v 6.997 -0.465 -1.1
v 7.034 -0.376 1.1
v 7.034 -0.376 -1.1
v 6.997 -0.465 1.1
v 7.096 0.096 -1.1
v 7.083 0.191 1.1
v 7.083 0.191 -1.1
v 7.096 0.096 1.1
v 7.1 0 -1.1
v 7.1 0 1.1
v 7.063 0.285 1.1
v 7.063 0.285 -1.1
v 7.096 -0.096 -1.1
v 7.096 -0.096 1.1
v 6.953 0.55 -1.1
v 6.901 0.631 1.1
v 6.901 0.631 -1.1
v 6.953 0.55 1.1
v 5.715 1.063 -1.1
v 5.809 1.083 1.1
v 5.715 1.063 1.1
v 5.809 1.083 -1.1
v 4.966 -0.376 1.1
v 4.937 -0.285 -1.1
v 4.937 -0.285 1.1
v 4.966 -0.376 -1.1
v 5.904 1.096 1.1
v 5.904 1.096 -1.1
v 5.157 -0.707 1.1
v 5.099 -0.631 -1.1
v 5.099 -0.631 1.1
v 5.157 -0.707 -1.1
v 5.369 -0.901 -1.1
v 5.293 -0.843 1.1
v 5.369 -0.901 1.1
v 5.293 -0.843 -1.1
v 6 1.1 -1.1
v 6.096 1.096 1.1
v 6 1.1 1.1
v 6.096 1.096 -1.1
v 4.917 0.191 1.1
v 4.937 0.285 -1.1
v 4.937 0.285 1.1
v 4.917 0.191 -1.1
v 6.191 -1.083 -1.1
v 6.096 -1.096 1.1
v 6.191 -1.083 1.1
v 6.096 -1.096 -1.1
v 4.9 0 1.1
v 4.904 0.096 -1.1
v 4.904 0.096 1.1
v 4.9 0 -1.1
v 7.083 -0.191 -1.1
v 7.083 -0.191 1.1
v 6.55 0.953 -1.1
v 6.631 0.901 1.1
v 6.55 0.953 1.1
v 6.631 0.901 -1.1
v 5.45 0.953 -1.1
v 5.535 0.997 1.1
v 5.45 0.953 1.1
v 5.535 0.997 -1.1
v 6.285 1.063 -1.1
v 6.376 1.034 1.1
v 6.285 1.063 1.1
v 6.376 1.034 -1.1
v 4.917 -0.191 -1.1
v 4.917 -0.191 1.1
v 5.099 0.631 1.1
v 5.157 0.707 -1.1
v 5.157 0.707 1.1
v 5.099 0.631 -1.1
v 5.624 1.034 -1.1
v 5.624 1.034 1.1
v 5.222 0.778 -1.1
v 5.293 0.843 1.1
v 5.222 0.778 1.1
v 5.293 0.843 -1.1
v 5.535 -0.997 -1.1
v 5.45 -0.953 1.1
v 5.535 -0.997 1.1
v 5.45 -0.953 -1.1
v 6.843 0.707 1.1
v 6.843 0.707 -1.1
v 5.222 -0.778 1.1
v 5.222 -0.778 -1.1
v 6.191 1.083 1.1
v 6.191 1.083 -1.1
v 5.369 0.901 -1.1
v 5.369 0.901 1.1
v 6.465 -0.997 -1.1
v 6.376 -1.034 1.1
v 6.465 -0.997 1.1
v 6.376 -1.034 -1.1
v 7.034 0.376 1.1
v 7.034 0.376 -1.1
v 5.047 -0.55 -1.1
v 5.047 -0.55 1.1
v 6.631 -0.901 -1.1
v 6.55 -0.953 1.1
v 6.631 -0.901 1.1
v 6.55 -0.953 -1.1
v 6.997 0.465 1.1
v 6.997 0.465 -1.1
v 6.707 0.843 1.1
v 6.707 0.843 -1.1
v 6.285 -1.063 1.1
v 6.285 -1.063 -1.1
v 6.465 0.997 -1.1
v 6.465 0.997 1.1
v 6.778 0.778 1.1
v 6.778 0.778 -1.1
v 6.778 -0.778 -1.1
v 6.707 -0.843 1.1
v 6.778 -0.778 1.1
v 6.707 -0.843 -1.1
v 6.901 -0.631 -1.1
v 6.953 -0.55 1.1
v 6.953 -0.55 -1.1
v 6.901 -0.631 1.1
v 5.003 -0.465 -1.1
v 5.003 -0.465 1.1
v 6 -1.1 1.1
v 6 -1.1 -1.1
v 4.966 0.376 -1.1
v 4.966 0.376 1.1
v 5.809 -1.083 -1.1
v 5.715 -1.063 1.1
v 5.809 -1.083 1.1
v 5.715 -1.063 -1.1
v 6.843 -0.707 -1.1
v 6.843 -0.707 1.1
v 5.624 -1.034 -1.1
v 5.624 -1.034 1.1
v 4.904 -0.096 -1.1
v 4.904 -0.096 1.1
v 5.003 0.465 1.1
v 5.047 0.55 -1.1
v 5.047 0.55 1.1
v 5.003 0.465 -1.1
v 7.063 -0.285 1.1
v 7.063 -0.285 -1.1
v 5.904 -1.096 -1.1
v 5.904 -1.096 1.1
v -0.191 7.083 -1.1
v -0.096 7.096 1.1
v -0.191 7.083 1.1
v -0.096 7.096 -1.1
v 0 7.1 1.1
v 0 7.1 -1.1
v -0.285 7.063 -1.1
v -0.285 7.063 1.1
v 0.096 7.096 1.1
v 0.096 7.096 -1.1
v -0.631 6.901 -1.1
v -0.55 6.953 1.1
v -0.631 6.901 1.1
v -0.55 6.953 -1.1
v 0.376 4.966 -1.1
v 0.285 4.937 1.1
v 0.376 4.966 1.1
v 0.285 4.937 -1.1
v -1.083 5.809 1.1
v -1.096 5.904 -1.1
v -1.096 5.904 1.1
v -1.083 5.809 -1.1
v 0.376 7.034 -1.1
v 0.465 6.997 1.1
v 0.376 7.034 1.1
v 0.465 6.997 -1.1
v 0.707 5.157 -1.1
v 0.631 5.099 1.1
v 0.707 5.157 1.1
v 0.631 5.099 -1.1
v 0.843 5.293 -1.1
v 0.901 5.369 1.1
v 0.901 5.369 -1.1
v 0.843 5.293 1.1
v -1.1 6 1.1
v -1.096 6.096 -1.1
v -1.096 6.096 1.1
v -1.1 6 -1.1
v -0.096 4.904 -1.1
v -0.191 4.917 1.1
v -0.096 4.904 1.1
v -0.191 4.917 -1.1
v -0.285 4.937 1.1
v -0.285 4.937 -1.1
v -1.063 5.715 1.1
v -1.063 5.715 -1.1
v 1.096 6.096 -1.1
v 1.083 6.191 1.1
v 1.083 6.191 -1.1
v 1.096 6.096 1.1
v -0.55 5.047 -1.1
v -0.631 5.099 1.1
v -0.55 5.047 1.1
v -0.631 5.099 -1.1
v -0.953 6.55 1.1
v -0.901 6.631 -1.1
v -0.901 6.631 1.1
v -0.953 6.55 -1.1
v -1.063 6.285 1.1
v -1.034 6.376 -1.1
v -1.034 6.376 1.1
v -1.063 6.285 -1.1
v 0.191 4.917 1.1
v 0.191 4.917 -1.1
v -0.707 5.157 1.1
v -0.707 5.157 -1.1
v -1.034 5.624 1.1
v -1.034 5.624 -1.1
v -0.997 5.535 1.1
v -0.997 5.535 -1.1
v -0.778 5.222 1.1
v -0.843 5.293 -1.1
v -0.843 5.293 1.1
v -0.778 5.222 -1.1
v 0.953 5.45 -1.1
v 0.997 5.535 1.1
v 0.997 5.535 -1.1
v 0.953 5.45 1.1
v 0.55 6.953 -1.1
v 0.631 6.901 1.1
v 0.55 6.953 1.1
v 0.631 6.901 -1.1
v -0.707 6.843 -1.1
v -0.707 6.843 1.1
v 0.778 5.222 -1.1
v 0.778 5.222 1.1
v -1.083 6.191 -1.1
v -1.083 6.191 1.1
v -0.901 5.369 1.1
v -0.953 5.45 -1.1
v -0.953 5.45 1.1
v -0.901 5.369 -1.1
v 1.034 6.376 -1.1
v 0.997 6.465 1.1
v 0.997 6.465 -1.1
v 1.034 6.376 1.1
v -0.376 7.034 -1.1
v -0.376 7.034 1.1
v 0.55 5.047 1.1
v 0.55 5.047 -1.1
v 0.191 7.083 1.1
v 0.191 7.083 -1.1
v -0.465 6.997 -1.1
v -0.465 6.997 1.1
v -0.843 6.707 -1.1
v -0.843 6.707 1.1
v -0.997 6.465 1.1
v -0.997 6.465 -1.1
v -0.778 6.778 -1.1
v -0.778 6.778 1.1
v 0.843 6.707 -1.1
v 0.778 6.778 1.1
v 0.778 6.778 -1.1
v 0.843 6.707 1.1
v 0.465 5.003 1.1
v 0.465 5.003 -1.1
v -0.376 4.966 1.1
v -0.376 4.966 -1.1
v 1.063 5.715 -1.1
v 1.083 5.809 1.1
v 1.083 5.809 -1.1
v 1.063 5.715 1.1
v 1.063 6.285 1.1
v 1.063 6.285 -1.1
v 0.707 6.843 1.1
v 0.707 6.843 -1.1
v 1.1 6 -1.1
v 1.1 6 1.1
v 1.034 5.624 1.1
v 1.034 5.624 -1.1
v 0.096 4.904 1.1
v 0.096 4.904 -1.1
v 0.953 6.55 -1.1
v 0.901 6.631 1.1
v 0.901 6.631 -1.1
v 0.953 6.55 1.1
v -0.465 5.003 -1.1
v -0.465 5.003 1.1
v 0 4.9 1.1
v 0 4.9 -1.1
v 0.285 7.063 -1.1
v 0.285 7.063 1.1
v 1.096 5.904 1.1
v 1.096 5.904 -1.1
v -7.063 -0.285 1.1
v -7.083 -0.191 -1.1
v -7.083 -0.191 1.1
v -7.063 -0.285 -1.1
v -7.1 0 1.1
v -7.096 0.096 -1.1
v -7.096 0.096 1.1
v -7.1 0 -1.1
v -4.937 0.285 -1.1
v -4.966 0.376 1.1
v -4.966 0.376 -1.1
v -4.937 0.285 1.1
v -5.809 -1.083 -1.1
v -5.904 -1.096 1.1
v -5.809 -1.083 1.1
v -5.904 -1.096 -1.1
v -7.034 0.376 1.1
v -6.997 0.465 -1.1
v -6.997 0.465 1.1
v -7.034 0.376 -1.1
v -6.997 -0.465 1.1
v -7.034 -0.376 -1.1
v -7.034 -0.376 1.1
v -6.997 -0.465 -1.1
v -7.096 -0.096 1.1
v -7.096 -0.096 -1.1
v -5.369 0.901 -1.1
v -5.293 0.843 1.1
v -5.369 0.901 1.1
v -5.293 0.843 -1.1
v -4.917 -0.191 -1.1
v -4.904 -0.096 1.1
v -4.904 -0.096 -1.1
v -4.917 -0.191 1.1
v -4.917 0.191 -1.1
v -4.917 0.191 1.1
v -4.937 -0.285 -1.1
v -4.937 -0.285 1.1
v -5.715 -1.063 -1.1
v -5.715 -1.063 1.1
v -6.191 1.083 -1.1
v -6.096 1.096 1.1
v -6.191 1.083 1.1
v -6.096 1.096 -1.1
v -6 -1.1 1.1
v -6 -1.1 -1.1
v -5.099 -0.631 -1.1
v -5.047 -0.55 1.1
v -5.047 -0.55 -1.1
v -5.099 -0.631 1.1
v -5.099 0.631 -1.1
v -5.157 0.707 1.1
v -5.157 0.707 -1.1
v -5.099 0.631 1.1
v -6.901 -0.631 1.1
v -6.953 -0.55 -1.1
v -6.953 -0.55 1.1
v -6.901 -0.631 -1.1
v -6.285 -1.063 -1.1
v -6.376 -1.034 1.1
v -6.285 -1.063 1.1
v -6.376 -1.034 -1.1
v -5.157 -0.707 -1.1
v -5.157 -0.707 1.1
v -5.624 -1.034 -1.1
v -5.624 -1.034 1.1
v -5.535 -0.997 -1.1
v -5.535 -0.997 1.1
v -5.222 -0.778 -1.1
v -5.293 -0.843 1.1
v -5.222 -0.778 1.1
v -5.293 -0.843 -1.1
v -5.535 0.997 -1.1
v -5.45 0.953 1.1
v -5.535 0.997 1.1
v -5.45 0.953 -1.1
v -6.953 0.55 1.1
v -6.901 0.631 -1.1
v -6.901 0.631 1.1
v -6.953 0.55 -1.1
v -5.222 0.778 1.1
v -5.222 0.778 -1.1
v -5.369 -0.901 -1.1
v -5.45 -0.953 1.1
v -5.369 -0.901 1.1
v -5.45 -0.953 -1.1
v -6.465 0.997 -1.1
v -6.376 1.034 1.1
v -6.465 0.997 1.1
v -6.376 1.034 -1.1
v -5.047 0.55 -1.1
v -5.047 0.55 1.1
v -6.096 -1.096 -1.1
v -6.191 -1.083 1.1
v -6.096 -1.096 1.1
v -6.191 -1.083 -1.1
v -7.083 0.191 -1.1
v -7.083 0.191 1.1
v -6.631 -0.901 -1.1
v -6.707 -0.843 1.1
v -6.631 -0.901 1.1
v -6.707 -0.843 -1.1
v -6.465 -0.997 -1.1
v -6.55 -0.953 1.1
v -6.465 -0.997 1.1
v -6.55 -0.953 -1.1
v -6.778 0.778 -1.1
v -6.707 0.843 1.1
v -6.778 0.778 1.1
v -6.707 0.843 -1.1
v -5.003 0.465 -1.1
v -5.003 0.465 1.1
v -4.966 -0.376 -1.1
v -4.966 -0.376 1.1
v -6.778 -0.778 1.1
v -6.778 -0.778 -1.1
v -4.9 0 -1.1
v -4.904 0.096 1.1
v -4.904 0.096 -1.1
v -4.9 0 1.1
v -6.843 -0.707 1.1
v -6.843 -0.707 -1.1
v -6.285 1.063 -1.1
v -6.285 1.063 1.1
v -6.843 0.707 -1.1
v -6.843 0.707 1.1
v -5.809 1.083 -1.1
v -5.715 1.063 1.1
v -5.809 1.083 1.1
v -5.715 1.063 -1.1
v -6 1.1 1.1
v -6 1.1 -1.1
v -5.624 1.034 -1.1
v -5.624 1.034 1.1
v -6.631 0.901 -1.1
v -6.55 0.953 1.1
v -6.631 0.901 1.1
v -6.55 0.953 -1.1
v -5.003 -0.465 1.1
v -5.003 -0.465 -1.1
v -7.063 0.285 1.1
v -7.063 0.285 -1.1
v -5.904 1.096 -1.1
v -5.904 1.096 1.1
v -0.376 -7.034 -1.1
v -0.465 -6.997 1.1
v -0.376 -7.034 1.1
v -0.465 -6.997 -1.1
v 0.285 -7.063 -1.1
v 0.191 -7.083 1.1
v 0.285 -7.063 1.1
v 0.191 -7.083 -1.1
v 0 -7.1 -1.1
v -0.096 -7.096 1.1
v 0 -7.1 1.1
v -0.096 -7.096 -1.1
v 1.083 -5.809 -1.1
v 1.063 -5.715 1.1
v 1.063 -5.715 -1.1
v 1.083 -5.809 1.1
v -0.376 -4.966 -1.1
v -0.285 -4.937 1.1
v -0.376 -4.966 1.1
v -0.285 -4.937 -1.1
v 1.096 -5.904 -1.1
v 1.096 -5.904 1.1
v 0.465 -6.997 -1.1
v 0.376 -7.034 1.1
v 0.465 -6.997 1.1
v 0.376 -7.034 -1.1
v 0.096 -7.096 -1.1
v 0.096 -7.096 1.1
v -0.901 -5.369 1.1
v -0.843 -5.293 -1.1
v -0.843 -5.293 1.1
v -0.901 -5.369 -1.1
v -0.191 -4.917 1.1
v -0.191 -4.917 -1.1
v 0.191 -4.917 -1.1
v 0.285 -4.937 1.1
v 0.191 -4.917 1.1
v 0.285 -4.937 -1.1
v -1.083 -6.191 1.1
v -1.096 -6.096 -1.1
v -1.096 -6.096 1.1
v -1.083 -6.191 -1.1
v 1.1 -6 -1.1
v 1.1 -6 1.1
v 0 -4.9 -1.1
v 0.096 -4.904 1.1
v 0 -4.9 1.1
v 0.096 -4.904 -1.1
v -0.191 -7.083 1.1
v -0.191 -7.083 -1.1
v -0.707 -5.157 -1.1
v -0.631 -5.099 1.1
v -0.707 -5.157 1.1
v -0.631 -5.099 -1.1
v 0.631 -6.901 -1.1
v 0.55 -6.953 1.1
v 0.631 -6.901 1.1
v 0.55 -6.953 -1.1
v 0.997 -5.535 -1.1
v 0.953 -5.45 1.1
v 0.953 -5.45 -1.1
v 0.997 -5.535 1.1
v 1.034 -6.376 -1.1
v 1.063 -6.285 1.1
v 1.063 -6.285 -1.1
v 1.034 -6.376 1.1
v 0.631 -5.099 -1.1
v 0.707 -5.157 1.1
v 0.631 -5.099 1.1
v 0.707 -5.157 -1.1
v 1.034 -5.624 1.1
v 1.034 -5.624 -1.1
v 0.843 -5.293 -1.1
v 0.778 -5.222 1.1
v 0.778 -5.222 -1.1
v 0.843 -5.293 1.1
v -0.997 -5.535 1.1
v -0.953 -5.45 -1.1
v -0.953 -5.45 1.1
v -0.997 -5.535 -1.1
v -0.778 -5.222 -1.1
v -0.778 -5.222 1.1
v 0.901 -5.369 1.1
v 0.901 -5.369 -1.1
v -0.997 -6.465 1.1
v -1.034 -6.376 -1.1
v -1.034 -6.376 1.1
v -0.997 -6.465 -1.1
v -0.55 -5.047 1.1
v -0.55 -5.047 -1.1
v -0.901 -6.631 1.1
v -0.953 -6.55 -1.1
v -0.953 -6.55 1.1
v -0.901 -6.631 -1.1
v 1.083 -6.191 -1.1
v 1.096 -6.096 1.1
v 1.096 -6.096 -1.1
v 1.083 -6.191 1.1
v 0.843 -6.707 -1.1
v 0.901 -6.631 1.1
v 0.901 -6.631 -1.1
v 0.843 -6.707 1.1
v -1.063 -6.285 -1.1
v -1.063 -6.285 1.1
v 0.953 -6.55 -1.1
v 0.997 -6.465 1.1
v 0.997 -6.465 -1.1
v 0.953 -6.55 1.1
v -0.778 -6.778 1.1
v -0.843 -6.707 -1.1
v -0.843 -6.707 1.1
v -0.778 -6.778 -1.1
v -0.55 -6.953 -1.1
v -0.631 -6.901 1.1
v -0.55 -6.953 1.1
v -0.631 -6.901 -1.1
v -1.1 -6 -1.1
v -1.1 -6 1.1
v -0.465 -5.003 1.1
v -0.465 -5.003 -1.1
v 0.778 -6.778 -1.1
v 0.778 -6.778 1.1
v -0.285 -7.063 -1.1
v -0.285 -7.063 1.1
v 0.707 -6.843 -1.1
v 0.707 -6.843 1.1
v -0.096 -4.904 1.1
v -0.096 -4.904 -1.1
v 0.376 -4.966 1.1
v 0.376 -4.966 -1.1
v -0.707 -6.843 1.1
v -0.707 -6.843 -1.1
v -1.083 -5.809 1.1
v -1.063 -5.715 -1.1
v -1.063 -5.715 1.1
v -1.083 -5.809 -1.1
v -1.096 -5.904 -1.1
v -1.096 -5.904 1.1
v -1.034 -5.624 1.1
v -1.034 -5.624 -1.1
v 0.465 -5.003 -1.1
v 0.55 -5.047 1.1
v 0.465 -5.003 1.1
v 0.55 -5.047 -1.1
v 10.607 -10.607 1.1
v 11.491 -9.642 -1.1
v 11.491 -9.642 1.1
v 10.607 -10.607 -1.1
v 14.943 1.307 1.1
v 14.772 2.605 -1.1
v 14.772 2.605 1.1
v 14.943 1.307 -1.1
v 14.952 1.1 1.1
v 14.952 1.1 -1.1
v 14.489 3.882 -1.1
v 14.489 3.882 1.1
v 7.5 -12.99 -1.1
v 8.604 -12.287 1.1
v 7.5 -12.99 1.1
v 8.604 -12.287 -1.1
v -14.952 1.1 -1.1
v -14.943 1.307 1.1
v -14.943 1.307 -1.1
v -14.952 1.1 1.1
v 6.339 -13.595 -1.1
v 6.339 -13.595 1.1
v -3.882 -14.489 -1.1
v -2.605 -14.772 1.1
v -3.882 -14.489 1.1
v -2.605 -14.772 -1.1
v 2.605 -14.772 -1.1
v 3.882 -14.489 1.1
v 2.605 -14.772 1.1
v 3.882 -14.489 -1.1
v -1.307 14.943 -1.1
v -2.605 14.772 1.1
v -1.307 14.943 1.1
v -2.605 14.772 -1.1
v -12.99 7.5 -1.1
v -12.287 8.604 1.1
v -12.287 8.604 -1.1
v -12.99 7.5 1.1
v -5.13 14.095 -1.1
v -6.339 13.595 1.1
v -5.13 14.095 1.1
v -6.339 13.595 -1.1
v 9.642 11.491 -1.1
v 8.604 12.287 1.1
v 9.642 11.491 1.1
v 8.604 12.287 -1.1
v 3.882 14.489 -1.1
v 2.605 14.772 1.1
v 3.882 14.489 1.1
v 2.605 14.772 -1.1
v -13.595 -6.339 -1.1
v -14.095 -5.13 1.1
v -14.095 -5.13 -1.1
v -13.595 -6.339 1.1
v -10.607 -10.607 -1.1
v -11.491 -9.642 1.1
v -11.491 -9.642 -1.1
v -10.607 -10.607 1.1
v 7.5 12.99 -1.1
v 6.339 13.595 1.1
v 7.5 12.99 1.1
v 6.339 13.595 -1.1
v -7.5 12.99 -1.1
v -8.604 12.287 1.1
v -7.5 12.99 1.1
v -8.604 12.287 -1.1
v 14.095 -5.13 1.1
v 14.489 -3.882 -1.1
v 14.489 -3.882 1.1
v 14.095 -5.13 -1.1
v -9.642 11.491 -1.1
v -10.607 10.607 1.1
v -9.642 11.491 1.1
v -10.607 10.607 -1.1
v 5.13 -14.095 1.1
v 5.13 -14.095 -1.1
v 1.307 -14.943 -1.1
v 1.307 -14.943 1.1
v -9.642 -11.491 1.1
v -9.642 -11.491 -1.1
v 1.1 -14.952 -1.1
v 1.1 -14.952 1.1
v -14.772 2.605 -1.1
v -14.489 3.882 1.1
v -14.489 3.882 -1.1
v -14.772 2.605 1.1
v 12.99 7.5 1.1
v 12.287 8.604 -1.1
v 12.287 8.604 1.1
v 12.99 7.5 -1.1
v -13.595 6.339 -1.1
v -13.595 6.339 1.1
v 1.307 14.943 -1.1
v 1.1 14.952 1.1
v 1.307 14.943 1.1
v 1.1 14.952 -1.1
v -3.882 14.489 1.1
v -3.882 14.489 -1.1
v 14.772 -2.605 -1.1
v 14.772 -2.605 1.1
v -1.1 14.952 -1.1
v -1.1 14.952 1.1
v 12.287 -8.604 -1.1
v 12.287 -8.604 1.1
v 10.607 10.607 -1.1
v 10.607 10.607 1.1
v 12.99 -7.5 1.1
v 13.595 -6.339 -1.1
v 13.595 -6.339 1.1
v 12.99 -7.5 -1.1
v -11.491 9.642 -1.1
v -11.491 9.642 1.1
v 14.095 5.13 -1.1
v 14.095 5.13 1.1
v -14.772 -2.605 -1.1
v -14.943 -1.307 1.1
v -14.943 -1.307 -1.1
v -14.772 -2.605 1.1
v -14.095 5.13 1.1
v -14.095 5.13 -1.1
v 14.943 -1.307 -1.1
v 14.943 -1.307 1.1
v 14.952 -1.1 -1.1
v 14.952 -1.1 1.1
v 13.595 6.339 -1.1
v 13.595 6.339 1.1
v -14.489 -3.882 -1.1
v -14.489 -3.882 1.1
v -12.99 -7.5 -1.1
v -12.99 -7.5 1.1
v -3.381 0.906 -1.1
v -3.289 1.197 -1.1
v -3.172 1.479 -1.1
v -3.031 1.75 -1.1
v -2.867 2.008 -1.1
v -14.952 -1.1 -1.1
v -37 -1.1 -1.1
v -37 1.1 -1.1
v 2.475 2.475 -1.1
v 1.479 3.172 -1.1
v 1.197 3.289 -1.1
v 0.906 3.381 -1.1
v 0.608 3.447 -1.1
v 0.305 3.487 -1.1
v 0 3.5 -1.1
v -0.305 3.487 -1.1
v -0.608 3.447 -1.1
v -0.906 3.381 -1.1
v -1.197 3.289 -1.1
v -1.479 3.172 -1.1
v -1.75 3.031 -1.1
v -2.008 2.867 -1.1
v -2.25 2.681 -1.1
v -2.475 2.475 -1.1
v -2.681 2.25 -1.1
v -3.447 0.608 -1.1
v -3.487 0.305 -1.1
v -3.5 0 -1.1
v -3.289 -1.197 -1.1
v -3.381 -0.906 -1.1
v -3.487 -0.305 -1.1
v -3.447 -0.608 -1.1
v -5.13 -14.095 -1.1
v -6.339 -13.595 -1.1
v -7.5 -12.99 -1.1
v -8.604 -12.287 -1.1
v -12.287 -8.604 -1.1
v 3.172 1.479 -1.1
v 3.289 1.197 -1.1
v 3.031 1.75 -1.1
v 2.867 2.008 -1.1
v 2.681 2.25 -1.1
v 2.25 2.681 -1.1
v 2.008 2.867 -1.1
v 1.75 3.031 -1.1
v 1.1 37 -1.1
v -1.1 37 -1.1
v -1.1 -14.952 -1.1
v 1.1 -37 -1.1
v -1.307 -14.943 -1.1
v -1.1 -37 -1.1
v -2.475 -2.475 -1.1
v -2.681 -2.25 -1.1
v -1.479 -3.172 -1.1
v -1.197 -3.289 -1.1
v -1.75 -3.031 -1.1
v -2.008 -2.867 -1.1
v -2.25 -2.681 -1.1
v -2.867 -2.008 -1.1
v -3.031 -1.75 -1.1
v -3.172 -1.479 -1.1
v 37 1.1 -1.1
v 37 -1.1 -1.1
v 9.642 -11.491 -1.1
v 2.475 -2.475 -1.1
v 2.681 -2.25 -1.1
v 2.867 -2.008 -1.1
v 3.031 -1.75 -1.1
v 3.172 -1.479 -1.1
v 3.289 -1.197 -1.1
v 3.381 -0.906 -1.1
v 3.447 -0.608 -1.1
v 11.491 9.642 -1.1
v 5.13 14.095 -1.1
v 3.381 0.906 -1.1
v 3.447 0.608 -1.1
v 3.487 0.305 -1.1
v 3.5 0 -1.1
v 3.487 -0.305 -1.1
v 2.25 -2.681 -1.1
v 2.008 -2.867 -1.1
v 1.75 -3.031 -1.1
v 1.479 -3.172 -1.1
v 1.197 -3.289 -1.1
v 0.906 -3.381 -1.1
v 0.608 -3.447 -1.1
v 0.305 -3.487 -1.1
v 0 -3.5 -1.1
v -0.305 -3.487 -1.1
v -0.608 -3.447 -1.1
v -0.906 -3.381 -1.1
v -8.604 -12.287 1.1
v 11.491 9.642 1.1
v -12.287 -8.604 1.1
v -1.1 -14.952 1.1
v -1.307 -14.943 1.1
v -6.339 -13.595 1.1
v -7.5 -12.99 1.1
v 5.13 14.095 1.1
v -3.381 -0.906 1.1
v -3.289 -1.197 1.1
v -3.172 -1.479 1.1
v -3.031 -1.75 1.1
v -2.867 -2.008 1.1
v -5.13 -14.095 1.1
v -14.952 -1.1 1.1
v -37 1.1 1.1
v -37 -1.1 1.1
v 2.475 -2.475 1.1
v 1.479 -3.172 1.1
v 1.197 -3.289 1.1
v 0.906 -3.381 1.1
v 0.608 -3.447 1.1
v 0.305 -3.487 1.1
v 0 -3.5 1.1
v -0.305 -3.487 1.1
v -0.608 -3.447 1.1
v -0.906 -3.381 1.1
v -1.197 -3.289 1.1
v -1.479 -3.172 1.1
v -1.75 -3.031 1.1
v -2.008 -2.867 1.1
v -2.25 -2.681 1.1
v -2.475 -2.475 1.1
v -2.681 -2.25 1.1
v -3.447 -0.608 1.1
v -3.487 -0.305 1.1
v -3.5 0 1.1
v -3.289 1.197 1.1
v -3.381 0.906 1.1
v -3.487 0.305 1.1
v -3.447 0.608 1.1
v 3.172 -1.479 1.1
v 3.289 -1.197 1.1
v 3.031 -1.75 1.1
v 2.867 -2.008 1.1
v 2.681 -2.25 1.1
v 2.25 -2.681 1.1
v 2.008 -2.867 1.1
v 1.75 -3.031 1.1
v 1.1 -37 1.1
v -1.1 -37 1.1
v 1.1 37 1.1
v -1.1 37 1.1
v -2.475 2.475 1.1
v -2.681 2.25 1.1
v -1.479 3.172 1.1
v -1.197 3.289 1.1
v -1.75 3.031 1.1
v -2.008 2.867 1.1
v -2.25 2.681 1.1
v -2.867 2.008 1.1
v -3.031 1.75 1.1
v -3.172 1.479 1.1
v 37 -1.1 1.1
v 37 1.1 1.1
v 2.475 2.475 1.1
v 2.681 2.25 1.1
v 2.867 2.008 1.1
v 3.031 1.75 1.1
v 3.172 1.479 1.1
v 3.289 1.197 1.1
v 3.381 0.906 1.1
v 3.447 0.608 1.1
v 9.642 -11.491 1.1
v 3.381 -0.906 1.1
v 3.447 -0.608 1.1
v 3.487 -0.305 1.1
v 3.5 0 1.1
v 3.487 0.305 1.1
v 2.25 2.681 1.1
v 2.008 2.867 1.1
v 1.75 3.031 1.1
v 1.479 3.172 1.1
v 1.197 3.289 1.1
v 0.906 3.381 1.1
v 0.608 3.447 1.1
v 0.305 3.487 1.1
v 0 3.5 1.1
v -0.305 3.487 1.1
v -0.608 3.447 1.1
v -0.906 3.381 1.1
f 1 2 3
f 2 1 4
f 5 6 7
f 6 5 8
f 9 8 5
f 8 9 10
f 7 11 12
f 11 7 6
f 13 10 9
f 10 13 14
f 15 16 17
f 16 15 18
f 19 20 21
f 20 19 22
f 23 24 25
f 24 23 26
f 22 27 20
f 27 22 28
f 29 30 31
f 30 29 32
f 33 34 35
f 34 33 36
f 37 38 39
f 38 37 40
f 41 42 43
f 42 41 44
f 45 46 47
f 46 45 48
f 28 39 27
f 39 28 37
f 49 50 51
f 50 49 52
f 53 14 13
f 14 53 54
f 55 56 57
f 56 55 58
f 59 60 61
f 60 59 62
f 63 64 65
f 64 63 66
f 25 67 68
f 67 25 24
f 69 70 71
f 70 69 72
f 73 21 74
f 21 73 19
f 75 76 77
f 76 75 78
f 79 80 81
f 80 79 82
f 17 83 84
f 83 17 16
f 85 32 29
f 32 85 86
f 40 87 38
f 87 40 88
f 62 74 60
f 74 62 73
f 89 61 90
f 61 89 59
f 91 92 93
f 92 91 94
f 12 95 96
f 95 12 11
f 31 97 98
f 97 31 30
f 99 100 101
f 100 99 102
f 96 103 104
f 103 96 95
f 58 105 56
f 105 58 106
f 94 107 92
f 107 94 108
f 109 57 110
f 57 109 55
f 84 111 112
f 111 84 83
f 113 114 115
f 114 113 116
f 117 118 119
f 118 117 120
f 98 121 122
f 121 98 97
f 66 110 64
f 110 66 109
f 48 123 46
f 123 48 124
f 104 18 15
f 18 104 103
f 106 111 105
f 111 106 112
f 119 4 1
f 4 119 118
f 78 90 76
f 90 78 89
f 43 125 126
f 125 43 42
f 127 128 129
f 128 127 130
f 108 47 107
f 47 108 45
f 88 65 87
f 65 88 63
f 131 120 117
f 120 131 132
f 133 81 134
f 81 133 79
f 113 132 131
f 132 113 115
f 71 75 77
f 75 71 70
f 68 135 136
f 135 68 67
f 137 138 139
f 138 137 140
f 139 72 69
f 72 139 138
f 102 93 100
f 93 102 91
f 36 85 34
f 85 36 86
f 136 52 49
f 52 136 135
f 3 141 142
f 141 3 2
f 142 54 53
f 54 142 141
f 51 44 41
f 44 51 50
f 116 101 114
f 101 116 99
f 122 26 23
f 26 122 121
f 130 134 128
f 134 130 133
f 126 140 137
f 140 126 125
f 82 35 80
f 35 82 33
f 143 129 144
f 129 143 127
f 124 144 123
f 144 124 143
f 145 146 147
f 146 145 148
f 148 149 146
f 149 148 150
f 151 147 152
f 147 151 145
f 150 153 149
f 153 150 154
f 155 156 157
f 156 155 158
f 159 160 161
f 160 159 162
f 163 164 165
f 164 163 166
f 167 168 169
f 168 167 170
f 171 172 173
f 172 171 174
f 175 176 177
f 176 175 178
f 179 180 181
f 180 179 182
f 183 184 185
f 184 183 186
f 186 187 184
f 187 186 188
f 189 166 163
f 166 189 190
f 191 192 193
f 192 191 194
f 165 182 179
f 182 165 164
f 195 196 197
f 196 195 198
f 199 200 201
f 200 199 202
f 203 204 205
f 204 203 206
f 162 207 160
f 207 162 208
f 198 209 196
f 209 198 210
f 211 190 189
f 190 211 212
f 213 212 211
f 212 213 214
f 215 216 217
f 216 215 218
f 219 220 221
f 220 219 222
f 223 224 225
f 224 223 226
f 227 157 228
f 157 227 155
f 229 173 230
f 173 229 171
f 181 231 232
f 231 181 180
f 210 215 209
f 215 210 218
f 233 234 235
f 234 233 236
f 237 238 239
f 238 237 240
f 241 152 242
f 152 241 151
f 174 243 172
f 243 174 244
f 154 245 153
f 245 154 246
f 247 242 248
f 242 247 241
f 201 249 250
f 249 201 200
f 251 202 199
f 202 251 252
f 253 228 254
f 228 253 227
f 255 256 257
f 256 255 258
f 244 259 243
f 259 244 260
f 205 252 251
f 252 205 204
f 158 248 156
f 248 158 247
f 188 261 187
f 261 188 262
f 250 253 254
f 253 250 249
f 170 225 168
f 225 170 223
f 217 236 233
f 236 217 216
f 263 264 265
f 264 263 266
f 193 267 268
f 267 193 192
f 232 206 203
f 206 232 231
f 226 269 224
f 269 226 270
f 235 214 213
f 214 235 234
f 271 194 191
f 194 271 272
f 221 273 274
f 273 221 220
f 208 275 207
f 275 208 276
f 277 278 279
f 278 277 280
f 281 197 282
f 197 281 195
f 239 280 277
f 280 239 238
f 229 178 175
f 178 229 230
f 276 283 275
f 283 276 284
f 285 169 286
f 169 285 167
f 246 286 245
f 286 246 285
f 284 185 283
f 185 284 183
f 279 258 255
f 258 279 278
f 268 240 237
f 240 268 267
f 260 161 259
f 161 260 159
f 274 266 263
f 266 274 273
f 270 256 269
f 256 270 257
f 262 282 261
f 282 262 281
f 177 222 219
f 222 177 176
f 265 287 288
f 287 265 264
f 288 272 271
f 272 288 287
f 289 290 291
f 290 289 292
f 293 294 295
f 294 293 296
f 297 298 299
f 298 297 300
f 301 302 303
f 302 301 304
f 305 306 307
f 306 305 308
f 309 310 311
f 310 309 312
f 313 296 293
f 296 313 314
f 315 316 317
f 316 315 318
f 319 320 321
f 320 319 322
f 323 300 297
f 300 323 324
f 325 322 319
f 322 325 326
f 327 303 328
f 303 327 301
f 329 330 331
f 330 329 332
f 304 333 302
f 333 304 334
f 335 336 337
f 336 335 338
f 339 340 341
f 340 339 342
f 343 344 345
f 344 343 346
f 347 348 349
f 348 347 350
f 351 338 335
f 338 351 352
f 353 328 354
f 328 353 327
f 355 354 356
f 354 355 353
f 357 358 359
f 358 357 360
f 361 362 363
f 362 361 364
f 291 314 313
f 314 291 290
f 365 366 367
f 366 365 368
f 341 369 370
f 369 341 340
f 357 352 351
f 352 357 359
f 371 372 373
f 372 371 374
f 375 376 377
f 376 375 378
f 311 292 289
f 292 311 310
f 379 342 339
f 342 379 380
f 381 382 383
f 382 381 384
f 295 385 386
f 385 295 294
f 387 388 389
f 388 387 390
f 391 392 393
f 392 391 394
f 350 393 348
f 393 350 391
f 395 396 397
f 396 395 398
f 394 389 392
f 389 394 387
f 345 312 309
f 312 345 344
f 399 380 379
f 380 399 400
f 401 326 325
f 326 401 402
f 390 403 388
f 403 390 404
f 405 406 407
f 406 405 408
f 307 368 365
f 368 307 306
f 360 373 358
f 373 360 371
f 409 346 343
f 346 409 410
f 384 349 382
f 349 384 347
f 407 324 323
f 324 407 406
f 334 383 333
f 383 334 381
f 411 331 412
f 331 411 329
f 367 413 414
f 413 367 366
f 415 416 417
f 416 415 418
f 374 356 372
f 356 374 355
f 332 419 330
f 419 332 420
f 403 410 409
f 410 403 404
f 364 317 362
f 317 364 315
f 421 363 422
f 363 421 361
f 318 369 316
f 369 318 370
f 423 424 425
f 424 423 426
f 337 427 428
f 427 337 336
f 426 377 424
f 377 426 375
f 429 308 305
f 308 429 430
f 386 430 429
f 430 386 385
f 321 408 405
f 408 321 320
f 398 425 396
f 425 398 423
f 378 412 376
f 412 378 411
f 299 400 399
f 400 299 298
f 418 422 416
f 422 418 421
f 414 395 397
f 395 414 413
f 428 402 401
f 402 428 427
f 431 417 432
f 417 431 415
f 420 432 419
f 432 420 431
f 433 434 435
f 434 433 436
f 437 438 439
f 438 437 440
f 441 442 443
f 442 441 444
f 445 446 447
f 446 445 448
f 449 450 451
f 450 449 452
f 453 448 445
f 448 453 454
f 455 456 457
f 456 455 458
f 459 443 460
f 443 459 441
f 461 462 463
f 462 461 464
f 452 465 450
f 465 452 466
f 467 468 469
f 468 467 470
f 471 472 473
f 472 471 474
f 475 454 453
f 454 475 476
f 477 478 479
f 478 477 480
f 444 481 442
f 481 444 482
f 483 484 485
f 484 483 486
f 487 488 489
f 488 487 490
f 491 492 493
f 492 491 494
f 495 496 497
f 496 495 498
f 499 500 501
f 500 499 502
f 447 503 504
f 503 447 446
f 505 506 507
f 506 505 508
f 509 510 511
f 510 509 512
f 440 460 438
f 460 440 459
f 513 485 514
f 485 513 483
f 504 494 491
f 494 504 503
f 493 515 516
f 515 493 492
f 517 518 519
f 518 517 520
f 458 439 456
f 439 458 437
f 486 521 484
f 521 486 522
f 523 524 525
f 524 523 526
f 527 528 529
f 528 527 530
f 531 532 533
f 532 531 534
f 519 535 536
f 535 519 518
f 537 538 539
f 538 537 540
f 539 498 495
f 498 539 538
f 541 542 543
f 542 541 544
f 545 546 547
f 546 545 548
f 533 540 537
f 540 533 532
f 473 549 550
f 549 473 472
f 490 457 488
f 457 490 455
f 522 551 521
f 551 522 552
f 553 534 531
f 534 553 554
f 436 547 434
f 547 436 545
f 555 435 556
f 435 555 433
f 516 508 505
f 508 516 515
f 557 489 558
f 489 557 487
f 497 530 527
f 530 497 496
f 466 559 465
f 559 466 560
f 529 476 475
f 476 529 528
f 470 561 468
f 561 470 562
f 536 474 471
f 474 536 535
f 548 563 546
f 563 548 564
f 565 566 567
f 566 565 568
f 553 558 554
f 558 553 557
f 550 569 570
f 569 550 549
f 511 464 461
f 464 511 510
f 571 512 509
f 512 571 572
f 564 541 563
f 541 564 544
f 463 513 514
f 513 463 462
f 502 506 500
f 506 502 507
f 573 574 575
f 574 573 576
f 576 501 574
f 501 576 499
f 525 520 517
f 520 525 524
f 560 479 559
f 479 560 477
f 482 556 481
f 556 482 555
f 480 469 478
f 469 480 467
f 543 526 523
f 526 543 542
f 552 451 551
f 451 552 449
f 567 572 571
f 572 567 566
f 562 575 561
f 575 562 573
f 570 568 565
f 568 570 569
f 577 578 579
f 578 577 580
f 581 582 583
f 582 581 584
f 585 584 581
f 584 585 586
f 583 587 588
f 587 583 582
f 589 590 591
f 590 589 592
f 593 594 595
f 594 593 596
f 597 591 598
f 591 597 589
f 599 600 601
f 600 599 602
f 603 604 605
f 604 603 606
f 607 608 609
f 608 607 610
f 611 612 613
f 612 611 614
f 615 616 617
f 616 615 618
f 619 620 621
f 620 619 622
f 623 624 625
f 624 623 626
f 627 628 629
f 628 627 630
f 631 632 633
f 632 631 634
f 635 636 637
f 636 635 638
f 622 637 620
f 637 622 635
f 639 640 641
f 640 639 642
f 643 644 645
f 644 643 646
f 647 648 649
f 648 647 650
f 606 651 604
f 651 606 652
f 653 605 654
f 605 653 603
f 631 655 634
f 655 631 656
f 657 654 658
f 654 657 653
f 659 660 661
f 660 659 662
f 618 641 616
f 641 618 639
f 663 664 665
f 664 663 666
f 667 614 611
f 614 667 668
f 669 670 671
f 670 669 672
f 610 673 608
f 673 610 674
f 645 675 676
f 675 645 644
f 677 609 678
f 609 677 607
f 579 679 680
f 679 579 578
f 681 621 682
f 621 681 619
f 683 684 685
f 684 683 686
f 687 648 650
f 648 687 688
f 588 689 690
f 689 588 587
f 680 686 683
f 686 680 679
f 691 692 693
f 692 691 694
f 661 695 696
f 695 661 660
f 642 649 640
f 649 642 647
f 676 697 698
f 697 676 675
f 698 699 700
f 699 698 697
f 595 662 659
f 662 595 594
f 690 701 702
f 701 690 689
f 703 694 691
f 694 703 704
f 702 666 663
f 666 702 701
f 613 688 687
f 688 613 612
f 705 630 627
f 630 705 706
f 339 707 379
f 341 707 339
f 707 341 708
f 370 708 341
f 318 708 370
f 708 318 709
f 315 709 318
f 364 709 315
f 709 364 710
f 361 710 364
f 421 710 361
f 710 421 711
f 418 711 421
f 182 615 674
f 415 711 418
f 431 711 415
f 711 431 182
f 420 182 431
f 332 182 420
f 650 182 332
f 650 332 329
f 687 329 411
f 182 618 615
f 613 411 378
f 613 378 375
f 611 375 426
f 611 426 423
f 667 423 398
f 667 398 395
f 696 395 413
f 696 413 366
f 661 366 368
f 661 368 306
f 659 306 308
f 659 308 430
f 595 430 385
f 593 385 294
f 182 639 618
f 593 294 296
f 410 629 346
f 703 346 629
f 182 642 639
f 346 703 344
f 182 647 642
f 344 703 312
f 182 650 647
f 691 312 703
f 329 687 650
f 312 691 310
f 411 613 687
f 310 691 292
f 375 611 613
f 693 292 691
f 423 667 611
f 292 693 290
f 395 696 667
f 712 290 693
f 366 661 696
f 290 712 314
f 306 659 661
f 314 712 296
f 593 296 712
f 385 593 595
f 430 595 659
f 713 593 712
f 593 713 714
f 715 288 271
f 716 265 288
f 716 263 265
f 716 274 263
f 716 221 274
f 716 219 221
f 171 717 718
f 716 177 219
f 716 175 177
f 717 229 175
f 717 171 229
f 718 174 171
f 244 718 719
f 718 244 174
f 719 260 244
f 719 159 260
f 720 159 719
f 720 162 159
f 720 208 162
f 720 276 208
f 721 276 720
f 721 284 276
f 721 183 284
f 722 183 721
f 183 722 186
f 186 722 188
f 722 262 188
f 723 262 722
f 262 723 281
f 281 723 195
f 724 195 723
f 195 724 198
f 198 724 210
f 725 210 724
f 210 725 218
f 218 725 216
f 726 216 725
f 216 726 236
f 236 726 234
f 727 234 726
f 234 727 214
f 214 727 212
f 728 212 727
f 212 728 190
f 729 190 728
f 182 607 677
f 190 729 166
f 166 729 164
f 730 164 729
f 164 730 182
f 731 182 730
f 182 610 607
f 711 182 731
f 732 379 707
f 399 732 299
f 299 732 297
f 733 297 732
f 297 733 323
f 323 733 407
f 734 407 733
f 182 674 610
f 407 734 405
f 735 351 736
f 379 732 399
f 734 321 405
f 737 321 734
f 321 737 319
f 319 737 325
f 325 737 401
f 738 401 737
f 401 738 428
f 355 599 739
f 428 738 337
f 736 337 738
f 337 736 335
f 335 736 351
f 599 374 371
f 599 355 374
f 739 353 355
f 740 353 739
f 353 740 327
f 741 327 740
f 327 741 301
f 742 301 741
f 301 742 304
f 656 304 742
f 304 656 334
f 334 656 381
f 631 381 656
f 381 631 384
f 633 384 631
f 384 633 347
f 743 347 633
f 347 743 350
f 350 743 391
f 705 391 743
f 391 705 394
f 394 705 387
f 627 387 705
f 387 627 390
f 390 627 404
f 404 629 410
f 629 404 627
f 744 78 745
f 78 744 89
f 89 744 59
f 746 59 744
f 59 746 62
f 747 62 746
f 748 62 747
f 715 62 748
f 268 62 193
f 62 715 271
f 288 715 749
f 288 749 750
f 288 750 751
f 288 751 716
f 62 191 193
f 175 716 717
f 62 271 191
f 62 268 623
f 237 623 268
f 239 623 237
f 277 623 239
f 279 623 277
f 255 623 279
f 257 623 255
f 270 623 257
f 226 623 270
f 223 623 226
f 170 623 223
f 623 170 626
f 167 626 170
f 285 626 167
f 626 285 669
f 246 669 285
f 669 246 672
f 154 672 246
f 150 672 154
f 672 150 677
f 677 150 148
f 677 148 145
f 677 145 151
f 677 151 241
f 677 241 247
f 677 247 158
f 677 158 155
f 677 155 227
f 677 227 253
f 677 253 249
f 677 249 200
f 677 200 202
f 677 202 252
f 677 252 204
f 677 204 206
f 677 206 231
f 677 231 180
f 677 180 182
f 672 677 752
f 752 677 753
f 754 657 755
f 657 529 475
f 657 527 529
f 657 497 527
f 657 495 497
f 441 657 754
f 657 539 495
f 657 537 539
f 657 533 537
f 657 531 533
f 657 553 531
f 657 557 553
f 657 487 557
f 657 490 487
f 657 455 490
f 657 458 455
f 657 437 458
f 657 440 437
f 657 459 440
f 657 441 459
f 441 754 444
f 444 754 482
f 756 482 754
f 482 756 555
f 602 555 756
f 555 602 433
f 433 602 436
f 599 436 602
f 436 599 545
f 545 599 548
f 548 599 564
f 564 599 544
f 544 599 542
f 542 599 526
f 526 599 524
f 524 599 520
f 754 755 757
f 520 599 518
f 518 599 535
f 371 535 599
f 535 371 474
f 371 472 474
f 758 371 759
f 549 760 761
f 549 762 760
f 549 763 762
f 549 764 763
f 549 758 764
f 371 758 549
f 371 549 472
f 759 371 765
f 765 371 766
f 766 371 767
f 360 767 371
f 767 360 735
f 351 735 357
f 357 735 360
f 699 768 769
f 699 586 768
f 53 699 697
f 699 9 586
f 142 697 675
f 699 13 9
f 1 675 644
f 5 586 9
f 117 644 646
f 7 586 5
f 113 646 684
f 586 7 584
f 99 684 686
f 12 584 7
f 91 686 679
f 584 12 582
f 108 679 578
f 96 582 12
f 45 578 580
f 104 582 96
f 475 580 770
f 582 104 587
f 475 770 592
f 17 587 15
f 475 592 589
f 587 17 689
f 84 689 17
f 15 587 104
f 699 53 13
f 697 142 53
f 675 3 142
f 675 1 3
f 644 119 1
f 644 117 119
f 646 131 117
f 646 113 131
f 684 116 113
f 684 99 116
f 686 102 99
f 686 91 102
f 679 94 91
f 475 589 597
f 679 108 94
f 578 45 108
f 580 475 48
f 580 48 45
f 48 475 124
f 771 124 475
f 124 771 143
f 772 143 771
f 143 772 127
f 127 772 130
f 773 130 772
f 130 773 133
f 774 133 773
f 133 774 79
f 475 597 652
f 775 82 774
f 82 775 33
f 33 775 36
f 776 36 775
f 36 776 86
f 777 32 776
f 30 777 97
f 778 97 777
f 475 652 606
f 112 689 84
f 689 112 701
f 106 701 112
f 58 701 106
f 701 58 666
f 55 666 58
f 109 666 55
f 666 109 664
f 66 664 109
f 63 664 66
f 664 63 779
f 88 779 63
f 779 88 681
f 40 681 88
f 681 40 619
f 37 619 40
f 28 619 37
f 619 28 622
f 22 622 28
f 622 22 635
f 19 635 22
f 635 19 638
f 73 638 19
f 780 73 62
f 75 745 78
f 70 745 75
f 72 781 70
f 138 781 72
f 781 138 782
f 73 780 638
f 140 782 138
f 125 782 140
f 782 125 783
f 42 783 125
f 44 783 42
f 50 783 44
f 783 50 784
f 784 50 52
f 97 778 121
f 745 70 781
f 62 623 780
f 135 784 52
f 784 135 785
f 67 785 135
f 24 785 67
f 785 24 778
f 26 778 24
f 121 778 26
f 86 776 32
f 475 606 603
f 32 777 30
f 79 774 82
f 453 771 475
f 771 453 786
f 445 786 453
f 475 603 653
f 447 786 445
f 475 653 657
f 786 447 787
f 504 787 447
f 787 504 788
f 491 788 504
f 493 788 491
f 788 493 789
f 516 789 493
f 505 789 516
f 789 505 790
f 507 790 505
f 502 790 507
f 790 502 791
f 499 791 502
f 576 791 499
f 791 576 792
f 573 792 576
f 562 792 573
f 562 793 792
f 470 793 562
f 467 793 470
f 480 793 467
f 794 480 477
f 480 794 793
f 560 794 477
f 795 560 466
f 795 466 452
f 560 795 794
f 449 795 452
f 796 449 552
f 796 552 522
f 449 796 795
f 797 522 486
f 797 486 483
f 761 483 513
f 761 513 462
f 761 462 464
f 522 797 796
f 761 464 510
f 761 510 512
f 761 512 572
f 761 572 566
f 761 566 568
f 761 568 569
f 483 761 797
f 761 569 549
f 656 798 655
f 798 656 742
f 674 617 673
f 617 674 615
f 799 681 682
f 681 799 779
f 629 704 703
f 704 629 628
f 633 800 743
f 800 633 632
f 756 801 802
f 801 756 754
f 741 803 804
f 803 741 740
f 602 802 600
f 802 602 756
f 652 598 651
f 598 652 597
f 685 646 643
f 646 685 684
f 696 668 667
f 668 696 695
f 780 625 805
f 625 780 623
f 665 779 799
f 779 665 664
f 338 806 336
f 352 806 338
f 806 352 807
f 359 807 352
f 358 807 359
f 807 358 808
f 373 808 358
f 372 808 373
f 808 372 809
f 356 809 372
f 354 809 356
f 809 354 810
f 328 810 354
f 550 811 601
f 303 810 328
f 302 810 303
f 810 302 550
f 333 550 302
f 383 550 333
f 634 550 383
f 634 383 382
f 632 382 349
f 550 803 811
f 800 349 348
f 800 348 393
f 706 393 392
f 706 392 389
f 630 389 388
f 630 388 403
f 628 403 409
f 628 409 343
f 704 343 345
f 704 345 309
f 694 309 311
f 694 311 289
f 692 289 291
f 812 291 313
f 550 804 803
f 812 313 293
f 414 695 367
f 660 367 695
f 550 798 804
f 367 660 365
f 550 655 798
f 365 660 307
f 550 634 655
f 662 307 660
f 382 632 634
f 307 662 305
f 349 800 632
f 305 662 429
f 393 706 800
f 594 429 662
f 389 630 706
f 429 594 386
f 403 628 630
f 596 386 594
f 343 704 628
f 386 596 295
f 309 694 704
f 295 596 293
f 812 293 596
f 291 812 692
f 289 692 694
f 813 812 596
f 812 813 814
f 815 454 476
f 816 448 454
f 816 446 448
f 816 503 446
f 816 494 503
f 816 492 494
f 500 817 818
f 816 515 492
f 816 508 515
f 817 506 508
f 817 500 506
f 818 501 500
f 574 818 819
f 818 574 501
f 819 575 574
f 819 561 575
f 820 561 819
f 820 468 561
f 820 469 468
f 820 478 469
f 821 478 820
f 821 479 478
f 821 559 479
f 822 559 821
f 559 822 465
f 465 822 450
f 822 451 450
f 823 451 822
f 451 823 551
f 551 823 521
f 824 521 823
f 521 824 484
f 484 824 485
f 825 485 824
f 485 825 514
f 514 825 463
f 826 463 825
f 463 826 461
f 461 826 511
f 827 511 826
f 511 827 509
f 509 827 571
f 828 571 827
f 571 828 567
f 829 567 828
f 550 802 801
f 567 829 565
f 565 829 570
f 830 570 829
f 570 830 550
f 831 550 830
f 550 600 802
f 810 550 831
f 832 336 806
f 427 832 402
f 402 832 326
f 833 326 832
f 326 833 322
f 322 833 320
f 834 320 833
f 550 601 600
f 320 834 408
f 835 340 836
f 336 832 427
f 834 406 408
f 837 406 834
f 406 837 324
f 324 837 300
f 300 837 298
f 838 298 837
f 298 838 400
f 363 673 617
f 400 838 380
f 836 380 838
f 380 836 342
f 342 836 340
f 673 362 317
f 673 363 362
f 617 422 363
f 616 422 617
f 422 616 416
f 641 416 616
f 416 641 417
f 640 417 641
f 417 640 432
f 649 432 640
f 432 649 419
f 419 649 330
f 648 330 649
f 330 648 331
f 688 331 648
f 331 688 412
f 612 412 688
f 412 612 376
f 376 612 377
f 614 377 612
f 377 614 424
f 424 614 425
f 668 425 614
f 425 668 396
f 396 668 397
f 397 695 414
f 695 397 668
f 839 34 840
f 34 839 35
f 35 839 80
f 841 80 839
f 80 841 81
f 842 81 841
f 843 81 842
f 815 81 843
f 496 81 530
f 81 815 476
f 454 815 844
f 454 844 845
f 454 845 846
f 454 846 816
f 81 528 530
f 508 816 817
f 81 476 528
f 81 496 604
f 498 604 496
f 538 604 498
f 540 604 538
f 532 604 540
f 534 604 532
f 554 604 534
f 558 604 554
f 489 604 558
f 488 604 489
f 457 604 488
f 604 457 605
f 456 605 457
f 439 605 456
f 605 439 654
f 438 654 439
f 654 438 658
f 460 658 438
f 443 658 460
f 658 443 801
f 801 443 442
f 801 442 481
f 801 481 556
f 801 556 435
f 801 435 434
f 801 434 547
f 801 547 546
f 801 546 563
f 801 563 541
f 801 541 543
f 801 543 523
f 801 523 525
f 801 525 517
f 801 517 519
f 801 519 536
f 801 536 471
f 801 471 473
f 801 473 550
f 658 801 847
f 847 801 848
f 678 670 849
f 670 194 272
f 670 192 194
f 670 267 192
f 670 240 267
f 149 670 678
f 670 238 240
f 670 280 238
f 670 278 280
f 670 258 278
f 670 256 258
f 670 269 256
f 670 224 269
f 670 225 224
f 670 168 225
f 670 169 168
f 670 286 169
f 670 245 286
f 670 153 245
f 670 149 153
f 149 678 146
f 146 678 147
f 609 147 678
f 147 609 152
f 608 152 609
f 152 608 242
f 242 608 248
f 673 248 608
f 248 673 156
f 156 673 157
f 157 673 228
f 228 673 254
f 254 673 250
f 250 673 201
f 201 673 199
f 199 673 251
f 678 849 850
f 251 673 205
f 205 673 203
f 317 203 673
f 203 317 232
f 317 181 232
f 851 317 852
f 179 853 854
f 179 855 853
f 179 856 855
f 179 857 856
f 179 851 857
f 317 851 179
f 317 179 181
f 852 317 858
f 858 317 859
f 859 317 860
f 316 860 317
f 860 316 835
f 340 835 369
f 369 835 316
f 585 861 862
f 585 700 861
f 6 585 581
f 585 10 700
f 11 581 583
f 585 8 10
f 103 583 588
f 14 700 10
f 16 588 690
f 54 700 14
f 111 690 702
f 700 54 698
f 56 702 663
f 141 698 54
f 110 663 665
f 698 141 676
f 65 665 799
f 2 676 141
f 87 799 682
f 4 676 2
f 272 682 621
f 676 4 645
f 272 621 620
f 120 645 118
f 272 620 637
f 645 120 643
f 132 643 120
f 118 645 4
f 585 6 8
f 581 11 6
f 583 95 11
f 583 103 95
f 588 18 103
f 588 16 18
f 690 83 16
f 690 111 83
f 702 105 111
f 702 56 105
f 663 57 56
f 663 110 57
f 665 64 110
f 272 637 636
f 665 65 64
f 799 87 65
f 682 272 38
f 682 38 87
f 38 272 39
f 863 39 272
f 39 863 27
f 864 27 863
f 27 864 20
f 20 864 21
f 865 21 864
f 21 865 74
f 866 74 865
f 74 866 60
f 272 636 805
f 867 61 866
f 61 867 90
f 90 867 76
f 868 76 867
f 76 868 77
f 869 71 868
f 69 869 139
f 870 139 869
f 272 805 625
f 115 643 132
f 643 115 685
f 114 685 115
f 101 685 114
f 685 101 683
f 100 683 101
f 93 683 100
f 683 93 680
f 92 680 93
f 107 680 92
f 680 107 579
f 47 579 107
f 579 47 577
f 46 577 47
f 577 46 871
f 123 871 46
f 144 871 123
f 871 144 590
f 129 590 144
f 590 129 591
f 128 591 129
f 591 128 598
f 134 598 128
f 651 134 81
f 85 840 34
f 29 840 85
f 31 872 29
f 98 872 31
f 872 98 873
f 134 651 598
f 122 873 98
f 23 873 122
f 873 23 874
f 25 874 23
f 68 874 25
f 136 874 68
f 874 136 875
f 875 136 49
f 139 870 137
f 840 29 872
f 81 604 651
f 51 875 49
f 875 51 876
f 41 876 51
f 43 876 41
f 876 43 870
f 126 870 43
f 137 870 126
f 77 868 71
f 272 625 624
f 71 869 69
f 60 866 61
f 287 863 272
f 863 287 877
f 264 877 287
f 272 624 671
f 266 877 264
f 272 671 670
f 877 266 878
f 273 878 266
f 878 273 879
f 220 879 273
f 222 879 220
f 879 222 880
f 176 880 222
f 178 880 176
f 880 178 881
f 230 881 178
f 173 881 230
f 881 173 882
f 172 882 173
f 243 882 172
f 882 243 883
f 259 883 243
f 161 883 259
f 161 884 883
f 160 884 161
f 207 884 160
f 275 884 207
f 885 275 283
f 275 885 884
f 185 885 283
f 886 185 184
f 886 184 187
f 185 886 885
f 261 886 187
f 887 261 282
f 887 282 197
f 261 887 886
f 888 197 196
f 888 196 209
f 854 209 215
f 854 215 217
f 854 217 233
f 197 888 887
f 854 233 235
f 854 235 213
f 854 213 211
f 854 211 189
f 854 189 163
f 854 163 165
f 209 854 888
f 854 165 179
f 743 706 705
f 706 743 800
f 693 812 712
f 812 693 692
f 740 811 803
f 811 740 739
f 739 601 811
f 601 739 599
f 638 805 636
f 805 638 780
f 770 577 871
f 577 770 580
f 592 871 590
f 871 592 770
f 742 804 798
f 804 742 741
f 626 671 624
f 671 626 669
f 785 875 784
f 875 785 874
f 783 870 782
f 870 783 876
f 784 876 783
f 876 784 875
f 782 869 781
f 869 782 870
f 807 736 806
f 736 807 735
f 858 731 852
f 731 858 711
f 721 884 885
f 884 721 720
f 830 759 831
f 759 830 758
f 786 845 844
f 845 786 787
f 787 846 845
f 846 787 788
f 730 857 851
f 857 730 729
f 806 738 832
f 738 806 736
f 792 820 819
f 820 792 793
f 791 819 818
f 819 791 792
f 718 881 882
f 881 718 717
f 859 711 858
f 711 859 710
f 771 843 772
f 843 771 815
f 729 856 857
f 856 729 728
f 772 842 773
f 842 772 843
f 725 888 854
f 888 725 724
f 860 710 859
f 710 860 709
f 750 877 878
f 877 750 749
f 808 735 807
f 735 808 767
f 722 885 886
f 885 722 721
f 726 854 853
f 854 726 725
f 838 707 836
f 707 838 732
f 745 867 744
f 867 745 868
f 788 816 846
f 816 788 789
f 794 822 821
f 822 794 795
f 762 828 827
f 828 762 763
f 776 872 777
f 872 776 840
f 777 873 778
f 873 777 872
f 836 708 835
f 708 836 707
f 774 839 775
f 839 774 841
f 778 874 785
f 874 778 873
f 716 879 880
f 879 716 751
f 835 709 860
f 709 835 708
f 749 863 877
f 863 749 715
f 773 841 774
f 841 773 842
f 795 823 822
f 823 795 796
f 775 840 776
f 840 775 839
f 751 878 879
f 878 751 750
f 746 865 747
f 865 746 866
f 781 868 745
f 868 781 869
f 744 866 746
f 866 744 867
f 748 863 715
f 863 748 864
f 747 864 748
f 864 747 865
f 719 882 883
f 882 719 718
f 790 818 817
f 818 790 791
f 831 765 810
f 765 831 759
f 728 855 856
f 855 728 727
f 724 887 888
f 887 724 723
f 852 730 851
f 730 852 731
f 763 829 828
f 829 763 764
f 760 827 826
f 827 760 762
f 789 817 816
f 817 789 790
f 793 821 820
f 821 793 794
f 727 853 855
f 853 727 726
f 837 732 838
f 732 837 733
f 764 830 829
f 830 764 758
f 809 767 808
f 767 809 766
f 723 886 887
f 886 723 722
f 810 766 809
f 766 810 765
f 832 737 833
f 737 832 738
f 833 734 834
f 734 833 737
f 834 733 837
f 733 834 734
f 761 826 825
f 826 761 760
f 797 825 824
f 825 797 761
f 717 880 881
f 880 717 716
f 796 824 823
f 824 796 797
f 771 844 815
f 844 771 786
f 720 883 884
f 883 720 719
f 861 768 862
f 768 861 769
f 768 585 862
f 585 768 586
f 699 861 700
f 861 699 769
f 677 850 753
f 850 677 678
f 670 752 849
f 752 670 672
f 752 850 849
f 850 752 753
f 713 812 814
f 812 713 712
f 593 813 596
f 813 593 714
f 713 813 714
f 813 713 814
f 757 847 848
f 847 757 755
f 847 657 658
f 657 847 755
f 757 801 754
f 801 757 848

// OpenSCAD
// file: 55_stage1_print_parameters.scad
/* BUDDY FILE 55 - STAGE 1 PRINT / INTERFACE PARAMETERS
All dimensions mm. Values marked PROCESS are starting points for calibration coupons. */
B1_OD=115; B1_CAVITY_D=111; B1_AIRWAY_D=70; B1_DUCT_OD=74;
B1_SHELL_R=B1_OD/2; B1_CAVITY_R=B1_CAVITY_D/2;
B1_WALL=2.0; B1_MIN_RIB=2.2; B1_MIN_WEB=1.2;
B1_FDM_SLIDE=0.30;       // PROCESS: per side, calibrate
B1_FDM_PRESS=0.10;       // PROCESS: per side, calibrate
B1_INSERT_OD=3.2;        // PLACEHOLDER for M2-class heat-set insert; replace from selected insert drawing
B1_M2_CLEAR=2.4;         // PROCESS starting clearance
B1_M2_HEAD=4.3;          // PLACEHOLDER head pocket
B1_M2_HEAD_H=1.8;
B1_POLAR_OPENING_D=74.8;
B1_CAMERA_DUCT_GAP=0.8; B1_CAMERA_SHELL_MARGIN=1.0;
B1_ROTOR_NOMINAL_R=34.6; B1_ROTOR_STATIC_RADIAL_GAP=B1_AIRWAY_D/2-B1_ROTOR_NOMINAL_R;
assert(B1_OD==115); assert(B1_CAVITY_D==111); assert(B1_AIRWAY_D==70);
assert(B1_POLAR_OPENING_D>B1_DUCT_OD);
assert(B1_ROTOR_STATIC_RADIAL_GAP>0);
echo("FILE55 Stage1 architecture OD/cavity/airway =",B1_OD,B1_CAVITY_D,B1_AIRWAY_D);
echo("PROCESS tolerances require calibration before production prints");
// main file
/* BUDDY FILE87 - MOTOR/STATOR MOUNT INTERFACE V1
Hardware-controlled dimensions are explicit variables, never hidden guesses. */
include <55_stage1_print_parameters.scad>
$fn=72;
MOTOR_D=20; MOTOR_LEN=10; BOLT_CIRCLE=12; BOLT_D=2.2; HUB_D=7; PLATE_T=2.2;
module motor_plate(){
 difference(){
  cylinder(h=PLATE_T,d=30,center=true);
  cylinder(h=PLATE_T+1,d=HUB_D,center=true);
  for(a=[0:90:270])rotate([0,0,a])translate([BOLT_CIRCLE/2,0,0])cylinder(h=PLATE_T+1,d=BOLT_D,center=true);
 }
}
module stator_mount(){
 motor_plate();
 for(a=[0:90:270])rotate([0,0,a])translate([B1_DUCT_OD/4+7,0,0])cube([B1_DUCT_OD/2-14,2.2,PLATE_T],center=true);
}
stator_mount();
echo("FILE87 motor mount variables MUST be replaced by selected motor drawing",MOTOR_D,MOTOR_LEN,BOLT_CIRCLE,BOLT_D);
